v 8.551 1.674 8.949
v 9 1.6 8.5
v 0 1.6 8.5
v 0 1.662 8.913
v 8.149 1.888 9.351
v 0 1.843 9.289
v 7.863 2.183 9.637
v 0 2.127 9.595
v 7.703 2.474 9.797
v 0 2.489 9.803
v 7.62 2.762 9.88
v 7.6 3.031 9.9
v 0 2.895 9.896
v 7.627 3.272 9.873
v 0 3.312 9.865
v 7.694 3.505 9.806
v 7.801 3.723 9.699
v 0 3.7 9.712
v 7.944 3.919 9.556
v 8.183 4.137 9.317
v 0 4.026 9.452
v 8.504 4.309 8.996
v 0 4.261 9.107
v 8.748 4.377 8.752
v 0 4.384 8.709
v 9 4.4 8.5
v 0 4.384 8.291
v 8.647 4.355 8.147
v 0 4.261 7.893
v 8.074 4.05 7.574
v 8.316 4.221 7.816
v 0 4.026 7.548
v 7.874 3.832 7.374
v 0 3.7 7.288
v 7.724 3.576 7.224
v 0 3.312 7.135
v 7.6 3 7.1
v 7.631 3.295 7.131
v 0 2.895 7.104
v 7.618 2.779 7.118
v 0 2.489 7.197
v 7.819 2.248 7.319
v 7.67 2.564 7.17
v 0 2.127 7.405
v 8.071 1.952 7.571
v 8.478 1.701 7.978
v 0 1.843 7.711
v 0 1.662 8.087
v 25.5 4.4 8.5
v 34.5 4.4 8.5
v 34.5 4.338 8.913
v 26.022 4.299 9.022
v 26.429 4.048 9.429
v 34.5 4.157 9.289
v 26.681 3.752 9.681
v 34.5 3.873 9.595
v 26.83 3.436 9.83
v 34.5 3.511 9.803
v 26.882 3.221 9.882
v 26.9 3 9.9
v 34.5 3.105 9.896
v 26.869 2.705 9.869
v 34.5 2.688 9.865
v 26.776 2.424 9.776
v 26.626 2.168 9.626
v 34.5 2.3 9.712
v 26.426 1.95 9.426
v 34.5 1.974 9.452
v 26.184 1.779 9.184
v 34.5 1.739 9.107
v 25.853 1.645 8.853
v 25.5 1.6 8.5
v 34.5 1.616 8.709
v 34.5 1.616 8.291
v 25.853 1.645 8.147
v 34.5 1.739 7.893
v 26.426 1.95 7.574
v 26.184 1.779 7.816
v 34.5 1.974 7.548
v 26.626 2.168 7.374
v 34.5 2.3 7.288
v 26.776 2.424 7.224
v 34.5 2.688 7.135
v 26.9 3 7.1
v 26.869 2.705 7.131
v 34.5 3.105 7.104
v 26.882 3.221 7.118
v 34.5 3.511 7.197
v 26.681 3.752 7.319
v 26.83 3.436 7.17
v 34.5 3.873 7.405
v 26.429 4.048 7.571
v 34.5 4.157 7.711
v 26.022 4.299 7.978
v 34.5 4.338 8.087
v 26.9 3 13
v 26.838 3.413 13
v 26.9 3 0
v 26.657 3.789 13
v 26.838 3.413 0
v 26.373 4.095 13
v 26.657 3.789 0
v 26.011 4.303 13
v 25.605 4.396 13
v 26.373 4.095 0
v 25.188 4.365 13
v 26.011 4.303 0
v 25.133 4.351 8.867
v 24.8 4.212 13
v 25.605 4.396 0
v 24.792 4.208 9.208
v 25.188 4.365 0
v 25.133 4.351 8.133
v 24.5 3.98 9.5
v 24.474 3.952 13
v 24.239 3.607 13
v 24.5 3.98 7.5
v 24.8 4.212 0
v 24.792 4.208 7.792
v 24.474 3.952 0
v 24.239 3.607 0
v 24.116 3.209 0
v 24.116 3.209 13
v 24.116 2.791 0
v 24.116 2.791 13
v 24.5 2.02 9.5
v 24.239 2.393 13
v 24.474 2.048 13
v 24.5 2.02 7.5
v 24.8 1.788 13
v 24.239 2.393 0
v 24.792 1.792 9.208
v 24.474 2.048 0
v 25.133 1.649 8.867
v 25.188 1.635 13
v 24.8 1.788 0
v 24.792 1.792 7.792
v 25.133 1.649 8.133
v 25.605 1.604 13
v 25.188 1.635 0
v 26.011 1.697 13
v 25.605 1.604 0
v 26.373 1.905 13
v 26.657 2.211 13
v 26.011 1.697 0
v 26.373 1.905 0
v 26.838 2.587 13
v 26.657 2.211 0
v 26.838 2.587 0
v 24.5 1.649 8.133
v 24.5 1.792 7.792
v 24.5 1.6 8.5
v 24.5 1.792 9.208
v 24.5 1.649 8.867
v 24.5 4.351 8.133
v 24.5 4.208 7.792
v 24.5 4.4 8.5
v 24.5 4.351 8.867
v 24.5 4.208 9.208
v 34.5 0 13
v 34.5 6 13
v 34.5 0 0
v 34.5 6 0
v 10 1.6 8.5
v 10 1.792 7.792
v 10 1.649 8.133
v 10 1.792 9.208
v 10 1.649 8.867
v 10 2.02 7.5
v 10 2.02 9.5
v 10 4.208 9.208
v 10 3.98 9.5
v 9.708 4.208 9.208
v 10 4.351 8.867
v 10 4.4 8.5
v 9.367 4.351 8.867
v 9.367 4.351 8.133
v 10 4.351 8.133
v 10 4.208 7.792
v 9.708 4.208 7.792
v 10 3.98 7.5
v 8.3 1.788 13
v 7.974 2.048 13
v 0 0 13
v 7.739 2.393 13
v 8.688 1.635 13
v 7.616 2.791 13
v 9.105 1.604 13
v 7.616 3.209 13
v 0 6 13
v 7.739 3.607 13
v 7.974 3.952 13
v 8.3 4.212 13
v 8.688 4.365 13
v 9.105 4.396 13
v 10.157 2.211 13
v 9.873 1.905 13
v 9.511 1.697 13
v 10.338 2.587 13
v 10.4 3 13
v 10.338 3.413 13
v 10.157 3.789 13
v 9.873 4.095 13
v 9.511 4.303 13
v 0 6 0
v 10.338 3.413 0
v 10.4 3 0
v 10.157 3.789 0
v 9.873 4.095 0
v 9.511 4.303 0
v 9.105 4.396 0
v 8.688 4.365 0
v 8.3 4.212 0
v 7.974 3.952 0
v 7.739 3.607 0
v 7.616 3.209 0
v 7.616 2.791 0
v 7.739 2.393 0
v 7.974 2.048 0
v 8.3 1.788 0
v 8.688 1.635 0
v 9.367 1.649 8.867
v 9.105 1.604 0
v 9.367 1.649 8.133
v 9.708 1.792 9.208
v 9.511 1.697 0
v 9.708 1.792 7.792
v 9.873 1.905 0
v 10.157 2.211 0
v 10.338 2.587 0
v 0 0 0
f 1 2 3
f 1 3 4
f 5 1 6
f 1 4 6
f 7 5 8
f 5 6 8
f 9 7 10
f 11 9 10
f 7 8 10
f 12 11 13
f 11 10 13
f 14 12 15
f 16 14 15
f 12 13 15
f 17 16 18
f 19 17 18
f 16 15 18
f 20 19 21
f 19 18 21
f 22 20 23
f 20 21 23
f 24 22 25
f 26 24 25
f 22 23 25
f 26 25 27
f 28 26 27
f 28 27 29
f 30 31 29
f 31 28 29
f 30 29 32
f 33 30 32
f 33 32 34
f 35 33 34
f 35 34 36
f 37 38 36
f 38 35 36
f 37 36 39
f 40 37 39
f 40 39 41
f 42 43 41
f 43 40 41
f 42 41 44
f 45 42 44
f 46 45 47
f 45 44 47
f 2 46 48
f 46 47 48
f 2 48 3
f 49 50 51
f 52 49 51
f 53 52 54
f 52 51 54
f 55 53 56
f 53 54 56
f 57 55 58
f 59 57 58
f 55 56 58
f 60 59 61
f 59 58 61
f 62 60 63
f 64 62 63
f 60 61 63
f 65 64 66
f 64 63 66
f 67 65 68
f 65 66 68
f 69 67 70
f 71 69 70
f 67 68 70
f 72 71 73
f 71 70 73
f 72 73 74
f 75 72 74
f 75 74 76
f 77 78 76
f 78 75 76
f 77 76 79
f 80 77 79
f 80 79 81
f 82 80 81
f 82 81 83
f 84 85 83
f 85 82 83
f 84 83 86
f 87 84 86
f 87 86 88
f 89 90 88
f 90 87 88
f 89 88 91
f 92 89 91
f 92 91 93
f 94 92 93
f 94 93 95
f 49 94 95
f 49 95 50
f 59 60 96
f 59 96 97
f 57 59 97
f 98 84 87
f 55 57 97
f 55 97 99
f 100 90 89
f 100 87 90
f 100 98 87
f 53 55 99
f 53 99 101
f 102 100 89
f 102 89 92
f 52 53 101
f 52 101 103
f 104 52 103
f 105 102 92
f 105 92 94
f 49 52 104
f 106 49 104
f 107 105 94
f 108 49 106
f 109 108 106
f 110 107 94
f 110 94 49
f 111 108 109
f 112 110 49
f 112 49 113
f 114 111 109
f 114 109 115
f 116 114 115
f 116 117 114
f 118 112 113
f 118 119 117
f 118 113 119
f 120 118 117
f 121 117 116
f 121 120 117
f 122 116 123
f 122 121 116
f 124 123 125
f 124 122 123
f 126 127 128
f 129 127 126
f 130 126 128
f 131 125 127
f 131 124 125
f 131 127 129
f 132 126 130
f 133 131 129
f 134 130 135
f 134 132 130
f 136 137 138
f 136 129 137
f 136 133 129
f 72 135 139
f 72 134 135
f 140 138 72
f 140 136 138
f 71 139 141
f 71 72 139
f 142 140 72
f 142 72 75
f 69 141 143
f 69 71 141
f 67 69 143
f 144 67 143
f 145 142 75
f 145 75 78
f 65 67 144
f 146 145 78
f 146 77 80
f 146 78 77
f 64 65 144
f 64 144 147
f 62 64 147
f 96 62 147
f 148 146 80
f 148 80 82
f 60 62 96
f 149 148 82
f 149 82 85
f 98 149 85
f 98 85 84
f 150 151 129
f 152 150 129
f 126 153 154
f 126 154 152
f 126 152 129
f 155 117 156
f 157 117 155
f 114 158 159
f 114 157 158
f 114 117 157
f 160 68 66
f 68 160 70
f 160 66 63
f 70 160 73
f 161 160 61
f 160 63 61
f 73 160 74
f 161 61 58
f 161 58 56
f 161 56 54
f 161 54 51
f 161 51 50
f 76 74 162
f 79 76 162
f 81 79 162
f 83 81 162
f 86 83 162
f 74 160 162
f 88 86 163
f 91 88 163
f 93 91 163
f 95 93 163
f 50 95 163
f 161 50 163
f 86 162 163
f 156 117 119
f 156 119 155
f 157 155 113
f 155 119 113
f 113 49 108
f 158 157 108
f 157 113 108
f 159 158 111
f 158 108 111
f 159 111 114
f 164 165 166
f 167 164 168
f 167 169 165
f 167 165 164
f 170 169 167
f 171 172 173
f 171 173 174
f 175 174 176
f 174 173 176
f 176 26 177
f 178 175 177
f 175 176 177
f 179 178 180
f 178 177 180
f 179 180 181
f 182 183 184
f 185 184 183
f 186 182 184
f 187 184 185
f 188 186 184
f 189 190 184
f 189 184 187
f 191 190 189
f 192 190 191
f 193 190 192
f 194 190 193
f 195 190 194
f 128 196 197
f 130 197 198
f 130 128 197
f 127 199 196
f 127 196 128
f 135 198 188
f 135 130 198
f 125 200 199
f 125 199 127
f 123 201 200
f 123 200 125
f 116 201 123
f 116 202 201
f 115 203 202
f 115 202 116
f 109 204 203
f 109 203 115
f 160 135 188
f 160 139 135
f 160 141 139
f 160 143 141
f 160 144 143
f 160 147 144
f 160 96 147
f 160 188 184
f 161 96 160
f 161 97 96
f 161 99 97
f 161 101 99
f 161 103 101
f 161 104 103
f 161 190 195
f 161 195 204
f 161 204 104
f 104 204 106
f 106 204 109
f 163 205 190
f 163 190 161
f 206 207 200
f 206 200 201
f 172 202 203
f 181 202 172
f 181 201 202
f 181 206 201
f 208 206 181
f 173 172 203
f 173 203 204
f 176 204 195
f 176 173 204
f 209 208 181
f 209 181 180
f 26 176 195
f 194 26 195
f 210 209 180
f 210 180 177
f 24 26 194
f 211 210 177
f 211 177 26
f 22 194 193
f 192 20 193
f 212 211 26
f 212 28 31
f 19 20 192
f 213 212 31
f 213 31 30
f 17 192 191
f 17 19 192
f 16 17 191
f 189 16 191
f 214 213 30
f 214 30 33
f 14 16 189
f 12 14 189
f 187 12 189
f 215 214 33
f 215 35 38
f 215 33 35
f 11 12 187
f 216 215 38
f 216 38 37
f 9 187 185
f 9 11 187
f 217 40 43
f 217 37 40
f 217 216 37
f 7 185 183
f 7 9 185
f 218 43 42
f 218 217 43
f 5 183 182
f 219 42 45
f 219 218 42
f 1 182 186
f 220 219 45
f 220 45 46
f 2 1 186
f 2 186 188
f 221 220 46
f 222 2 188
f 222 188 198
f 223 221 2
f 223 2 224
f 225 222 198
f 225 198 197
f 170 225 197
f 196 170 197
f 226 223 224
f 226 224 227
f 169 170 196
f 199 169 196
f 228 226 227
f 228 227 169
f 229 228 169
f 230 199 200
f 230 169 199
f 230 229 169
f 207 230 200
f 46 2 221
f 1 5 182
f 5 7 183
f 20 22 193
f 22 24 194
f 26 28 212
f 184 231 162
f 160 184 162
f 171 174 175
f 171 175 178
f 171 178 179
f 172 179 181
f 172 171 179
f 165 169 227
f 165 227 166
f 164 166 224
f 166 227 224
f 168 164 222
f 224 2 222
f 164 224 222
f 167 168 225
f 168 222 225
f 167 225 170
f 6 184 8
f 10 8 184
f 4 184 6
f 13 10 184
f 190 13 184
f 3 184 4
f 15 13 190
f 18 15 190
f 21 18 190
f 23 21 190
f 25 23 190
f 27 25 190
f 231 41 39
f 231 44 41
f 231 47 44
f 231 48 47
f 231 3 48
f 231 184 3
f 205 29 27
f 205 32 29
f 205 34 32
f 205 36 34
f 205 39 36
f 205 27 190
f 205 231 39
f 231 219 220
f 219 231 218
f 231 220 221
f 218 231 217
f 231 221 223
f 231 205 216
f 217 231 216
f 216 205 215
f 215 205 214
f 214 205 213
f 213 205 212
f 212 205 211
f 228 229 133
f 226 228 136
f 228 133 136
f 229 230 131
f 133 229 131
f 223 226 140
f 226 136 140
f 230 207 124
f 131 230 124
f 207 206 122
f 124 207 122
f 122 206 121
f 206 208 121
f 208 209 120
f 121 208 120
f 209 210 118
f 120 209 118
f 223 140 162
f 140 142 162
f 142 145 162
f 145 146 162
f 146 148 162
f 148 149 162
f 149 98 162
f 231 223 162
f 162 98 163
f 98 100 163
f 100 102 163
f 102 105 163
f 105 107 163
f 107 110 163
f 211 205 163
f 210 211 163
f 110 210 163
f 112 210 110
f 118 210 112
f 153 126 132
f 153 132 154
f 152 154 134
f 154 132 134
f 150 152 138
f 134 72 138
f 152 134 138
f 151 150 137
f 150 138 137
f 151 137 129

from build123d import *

# Parameters (mm, degrees)
F0_W     = 34.5
F0_H     = 6
F0_R     = 1.4
F1_DEPTH = 13
F2_R     = 1.4
F3_DEPTH = 10
F4_R     = 1.4
F5_DEPTH = 10


with BuildPart() as f1:
    # F0 (on Top) → F1 (new body)
    with BuildSketch(Plane.XY):
        with Locations((17.25, 3)):
            Rectangle(F0_W, F0_H)
        with Locations((9, 3)):
            Circle(F0_R, mode=Mode.SUBTRACT)
        with Locations((25.5, 3)):
            Circle(F0_R, mode=Mode.SUBTRACT)
    extrude(amount=F1_DEPTH)

    # F2 (on face) → F3 (cut)
    with BuildSketch(Plane(origin=(0, 0, 0), x_dir=(0, -1, 0), z_dir=(-1, 0, 0))):
        with Locations((-3, 8.5)):
            Circle(F2_R)
    extrude(amount=-F3_DEPTH, mode=Mode.SUBTRACT)

    # F4 (on face) → F5 (cut)
    with BuildSketch(Plane.YZ.offset(34.5)):
        with Locations((3, 8.5)):
            Circle(F4_R)
    extrude(amount=-F5_DEPTH, mode=Mode.SUBTRACT)


solid = f1.part
